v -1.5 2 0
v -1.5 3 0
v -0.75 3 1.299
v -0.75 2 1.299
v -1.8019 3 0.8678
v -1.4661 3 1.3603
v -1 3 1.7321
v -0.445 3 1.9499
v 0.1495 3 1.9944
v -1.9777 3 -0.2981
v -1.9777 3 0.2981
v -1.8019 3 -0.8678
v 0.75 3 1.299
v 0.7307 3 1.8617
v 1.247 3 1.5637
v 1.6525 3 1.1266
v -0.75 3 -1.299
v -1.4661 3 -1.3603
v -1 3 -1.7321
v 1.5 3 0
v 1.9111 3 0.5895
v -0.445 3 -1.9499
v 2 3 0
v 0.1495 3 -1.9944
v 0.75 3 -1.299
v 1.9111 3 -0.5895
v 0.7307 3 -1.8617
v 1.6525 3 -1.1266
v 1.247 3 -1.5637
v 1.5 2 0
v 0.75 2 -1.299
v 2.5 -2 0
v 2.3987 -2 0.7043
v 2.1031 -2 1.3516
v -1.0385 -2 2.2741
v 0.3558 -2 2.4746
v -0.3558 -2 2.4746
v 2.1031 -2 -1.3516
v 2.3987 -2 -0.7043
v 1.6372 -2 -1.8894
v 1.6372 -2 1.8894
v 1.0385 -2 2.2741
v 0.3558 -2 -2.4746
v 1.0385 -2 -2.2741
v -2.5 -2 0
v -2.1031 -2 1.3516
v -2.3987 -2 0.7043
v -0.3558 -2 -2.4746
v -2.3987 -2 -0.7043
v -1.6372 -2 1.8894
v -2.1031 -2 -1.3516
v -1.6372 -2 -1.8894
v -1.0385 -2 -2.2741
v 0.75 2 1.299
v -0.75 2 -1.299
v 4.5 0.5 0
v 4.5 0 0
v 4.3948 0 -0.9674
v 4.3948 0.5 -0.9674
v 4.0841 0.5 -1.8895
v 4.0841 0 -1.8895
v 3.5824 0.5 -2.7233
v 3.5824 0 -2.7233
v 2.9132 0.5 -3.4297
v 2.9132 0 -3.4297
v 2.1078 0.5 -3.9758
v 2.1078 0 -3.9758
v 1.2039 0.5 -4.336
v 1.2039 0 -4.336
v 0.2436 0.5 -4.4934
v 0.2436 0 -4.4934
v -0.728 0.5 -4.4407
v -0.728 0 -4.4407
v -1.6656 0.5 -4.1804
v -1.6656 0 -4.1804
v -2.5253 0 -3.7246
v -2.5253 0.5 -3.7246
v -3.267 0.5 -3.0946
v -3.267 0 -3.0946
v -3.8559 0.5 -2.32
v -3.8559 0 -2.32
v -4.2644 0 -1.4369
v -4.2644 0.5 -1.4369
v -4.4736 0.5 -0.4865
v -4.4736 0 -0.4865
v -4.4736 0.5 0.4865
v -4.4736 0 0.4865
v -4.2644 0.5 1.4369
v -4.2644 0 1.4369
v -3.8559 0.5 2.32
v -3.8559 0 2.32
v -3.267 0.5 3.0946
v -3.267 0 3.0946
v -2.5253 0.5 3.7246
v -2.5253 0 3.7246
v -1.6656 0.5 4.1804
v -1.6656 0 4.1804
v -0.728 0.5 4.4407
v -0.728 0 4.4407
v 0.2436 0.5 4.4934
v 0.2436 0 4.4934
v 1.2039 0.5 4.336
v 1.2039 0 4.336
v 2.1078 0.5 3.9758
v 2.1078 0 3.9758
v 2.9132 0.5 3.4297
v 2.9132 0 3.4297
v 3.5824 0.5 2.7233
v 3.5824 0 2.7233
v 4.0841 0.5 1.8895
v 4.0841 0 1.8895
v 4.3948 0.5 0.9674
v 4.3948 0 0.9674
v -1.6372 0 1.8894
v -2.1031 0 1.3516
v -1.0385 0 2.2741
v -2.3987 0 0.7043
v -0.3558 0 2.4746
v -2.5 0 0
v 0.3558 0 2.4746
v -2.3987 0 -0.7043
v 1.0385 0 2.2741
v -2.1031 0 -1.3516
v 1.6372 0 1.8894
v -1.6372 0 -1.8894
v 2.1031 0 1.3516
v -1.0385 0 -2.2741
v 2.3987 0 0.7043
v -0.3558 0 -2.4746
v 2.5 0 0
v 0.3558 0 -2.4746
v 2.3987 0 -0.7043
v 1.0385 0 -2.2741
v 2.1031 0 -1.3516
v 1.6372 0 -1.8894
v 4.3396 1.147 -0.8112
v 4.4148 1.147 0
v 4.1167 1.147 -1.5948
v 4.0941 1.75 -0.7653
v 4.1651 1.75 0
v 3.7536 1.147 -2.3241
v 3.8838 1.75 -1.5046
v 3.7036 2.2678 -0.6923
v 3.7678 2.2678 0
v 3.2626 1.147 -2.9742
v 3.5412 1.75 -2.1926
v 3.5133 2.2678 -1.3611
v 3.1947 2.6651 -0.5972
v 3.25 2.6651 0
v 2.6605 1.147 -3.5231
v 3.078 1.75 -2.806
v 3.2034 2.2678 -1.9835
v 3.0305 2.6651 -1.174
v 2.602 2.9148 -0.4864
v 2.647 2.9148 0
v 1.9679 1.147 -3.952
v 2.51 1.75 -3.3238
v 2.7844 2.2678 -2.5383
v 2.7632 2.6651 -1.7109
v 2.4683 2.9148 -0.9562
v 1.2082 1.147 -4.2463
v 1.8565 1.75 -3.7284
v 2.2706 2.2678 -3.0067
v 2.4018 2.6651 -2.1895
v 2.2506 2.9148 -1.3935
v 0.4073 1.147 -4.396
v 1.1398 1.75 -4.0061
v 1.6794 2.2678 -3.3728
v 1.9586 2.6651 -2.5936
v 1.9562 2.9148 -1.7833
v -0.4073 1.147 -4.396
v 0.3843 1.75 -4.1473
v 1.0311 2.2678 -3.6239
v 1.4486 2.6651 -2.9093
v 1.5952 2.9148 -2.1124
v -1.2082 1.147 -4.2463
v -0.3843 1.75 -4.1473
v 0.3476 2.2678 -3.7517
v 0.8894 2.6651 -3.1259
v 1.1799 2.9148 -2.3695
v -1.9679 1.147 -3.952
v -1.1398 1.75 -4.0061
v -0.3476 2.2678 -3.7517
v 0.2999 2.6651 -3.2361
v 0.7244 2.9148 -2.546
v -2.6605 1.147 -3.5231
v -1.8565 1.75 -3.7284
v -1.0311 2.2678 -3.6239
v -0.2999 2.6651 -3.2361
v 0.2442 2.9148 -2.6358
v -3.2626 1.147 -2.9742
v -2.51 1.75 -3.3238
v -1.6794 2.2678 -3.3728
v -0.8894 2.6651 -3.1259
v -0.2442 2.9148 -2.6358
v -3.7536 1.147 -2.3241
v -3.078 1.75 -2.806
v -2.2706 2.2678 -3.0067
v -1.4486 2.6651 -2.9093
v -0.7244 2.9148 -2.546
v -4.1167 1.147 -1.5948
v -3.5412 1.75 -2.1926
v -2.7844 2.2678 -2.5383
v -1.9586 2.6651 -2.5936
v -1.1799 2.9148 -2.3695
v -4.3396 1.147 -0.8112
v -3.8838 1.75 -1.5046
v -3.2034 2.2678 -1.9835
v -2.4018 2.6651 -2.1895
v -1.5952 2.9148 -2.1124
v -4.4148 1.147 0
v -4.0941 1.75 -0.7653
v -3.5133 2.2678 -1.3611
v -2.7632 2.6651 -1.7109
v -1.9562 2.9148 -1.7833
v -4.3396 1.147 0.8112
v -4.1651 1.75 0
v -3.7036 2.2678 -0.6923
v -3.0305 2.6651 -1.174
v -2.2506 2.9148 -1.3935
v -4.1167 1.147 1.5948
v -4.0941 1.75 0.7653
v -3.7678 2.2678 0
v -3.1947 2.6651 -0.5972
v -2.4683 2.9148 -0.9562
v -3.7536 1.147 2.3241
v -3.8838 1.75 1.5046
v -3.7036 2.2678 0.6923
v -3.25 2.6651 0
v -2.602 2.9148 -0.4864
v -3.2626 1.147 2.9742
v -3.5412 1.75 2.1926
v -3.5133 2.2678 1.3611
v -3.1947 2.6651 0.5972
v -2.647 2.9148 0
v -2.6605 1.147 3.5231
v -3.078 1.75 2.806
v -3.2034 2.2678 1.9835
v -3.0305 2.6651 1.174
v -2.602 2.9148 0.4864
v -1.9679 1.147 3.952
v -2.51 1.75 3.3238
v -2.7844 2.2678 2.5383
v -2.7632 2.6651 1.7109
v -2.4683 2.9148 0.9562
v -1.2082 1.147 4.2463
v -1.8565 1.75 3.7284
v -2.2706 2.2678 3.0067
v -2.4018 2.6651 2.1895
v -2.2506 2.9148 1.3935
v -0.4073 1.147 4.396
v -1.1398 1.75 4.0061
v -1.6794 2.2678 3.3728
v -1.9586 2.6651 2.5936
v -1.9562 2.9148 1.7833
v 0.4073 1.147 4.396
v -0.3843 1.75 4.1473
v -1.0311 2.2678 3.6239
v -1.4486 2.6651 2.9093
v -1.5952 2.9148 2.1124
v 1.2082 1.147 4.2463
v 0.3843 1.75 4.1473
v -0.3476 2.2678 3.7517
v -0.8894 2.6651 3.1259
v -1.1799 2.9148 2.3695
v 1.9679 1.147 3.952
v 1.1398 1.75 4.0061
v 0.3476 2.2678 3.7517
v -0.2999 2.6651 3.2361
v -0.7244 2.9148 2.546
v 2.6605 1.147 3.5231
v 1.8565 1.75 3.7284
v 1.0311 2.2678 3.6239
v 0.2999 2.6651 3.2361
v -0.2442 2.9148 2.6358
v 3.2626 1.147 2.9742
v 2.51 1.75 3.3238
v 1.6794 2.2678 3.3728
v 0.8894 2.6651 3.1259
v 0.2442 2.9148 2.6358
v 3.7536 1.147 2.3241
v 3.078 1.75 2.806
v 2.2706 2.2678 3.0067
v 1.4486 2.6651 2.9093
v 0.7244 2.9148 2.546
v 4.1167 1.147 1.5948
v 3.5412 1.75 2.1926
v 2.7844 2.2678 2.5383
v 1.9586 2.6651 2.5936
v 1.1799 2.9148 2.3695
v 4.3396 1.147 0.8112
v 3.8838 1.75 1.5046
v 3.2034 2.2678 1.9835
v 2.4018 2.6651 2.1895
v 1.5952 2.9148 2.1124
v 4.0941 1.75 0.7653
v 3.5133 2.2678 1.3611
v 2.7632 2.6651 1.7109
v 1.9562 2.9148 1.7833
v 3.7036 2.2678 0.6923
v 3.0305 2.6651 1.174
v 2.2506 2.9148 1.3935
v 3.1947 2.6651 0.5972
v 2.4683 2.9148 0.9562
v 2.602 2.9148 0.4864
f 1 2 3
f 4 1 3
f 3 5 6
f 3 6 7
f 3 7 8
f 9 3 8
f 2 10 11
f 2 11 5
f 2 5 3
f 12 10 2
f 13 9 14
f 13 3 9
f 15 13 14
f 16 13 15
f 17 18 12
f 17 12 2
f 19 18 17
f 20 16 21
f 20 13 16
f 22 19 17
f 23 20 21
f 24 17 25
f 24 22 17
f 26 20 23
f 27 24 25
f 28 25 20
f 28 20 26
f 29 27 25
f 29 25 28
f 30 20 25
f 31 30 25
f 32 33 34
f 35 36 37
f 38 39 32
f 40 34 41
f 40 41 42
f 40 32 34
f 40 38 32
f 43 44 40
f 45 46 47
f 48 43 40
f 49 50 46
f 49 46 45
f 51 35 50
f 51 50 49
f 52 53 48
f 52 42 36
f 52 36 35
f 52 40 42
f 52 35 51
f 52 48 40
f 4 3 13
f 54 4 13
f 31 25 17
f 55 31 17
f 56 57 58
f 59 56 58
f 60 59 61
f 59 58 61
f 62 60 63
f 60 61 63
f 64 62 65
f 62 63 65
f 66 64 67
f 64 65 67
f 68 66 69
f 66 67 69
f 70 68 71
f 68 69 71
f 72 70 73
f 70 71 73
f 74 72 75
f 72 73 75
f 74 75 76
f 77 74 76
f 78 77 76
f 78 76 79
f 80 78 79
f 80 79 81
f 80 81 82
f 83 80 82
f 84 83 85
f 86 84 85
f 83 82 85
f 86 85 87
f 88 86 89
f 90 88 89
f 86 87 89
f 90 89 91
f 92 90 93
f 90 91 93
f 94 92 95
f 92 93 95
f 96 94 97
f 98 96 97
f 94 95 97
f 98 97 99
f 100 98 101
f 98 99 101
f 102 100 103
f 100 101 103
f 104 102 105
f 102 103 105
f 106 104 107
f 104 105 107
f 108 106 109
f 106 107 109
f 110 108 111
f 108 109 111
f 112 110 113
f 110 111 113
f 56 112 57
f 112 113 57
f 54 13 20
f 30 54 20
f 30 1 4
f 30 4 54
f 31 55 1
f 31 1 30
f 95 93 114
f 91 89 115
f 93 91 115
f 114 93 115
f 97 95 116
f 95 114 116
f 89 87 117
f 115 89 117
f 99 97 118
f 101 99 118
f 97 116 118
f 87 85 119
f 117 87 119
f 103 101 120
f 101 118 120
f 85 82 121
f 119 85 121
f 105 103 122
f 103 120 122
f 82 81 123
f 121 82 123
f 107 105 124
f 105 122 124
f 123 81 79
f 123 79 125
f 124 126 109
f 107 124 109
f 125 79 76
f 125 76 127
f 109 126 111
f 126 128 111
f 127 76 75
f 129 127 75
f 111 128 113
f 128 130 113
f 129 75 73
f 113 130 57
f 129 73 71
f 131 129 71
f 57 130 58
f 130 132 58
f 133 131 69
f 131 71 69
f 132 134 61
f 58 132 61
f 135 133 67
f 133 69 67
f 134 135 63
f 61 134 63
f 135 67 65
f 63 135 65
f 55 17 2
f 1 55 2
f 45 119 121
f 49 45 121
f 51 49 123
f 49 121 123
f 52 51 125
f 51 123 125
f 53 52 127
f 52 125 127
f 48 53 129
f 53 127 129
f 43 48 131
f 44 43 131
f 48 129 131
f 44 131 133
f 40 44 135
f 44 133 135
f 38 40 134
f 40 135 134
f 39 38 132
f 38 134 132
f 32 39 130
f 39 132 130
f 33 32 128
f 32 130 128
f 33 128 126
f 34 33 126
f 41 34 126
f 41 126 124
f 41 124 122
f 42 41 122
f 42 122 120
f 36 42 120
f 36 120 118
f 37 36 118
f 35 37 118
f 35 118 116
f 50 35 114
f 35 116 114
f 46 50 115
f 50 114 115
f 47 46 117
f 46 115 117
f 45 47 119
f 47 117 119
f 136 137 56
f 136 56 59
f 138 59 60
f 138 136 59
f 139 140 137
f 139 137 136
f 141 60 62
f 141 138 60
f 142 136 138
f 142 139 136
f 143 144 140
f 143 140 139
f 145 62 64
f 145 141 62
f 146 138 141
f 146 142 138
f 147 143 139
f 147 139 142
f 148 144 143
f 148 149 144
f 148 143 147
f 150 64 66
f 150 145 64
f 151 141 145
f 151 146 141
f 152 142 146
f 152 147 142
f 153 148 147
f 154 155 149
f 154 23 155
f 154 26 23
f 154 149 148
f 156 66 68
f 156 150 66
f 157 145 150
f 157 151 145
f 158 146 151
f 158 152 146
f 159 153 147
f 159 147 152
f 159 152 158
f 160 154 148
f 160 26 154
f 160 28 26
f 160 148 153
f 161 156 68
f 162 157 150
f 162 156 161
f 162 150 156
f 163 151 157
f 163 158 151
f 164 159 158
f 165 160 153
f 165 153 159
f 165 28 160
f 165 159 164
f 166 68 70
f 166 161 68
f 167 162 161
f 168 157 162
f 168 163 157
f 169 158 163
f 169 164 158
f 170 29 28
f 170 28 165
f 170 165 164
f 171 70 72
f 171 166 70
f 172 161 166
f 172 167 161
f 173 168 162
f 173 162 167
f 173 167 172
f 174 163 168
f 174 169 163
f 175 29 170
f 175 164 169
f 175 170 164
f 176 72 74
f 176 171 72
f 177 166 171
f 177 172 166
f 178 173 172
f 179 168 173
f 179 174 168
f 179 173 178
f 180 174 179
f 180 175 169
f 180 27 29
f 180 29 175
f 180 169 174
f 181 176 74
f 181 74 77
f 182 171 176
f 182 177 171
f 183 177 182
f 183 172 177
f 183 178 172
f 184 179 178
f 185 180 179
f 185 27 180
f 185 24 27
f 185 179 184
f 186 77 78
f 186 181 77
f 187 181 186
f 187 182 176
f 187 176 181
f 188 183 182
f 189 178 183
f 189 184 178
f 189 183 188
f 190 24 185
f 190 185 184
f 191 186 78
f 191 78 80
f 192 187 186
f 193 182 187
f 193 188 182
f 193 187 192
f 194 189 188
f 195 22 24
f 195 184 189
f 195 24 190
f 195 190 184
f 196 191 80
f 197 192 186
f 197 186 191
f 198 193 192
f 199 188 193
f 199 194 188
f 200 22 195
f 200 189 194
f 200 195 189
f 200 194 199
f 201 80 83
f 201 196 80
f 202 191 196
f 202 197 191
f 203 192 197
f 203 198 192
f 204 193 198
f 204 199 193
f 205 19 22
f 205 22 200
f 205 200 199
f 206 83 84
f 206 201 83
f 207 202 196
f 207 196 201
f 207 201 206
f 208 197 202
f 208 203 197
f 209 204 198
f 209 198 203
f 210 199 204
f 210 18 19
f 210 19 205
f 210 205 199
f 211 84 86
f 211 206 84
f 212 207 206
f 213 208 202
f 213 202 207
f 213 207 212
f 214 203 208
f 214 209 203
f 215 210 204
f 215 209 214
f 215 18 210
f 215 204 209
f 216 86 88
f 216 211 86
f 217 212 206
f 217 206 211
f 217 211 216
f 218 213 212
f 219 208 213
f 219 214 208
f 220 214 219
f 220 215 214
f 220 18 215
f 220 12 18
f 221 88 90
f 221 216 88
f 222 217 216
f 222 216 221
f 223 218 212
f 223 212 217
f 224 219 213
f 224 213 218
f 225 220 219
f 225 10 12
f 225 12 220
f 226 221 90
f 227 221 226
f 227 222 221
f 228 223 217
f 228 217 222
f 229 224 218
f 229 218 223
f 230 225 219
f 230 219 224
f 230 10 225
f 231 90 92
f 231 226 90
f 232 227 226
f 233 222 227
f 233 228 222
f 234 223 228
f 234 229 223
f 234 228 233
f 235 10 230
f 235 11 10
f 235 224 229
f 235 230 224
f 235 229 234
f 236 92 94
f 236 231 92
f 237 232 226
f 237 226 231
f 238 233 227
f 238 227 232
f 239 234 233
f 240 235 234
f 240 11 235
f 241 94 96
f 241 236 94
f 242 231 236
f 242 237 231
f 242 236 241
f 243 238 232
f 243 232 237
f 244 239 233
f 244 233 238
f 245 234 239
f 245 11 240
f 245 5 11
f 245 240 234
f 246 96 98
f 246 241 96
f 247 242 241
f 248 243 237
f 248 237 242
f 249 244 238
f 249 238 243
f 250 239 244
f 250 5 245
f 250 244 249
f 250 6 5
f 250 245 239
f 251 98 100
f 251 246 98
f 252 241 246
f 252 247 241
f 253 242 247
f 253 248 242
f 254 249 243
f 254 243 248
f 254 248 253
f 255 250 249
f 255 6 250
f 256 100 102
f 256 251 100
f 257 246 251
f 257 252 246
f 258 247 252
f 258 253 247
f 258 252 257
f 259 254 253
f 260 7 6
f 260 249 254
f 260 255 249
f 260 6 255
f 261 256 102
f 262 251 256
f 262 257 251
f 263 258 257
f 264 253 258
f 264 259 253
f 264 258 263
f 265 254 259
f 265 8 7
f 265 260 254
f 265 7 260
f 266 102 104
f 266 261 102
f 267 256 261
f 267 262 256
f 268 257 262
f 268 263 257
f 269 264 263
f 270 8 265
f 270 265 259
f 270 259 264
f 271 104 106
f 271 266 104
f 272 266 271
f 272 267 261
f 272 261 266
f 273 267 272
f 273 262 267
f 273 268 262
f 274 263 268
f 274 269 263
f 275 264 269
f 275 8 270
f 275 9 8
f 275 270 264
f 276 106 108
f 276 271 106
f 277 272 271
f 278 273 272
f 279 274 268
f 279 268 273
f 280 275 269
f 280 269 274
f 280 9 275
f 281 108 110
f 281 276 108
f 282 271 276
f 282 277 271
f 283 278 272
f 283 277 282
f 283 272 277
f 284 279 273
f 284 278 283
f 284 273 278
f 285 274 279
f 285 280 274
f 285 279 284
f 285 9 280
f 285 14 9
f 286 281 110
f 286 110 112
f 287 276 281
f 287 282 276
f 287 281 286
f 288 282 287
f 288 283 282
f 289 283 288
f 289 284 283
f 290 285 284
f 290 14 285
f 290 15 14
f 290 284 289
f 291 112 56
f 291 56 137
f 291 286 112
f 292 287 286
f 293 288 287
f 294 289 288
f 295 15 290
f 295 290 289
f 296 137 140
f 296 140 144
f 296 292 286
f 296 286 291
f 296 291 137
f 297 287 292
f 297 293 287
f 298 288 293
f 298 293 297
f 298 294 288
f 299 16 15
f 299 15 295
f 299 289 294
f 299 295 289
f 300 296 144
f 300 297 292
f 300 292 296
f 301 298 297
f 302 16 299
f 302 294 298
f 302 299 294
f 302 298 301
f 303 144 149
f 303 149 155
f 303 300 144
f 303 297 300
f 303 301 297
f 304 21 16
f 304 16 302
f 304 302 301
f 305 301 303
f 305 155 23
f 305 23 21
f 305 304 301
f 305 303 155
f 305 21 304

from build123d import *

# Parameters (mm, degrees)
SKETCH1_R           = 4.5
BOSS_EXTRUDE1_DEPTH = 3
FILLET1_R           = 2.5
CUT_EXTRUDE1_DEPTH  = 1
SKETCH3_R           = 2.5
BOSS_EXTRUDE2_DEPTH = 2


with BuildPart() as part:
    # Sketch1 → Boss-Extrude1 (new body)
    with BuildSketch(Plane(origin=(0, 0, 0), x_dir=(1, 0, 0), z_dir=(0, 1, 0))):
        Circle(SKETCH1_R)
    extrude(amount=BOSS_EXTRUDE1_DEPTH)

    # Fillet1
    fillet1_edges = [part.edges().sort_by_distance(p)[0] for p in [
        (-4.5, 3, 0),
    ]]
    fillet(fillet1_edges, radius=FILLET1_R)

    # Sketch2 → Cut-Extrude1 (cut)
    with BuildSketch(Plane(origin=(0, 3, 0), x_dir=(1, 0, 0), z_dir=(0, 1, 0))):
        Polygon((1.5, 0), (0.75, 1.299038106), (-0.75, 1.299038106), (-1.5, 0), (-0.75, -1.299038106), (0.75, -1.299038106), align=None)
    extrude(amount=-CUT_EXTRUDE1_DEPTH, mode=Mode.SUBTRACT)

    # Sketch3 → Boss-Extrude2 (add)
    with BuildSketch(Plane(origin=(0, 0, 0), x_dir=(-1, 0, 0), z_dir=(0, -1, 0))):
        Circle(SKETCH3_R)
    extrude(amount=BOSS_EXTRUDE2_DEPTH)


solid = part.part
